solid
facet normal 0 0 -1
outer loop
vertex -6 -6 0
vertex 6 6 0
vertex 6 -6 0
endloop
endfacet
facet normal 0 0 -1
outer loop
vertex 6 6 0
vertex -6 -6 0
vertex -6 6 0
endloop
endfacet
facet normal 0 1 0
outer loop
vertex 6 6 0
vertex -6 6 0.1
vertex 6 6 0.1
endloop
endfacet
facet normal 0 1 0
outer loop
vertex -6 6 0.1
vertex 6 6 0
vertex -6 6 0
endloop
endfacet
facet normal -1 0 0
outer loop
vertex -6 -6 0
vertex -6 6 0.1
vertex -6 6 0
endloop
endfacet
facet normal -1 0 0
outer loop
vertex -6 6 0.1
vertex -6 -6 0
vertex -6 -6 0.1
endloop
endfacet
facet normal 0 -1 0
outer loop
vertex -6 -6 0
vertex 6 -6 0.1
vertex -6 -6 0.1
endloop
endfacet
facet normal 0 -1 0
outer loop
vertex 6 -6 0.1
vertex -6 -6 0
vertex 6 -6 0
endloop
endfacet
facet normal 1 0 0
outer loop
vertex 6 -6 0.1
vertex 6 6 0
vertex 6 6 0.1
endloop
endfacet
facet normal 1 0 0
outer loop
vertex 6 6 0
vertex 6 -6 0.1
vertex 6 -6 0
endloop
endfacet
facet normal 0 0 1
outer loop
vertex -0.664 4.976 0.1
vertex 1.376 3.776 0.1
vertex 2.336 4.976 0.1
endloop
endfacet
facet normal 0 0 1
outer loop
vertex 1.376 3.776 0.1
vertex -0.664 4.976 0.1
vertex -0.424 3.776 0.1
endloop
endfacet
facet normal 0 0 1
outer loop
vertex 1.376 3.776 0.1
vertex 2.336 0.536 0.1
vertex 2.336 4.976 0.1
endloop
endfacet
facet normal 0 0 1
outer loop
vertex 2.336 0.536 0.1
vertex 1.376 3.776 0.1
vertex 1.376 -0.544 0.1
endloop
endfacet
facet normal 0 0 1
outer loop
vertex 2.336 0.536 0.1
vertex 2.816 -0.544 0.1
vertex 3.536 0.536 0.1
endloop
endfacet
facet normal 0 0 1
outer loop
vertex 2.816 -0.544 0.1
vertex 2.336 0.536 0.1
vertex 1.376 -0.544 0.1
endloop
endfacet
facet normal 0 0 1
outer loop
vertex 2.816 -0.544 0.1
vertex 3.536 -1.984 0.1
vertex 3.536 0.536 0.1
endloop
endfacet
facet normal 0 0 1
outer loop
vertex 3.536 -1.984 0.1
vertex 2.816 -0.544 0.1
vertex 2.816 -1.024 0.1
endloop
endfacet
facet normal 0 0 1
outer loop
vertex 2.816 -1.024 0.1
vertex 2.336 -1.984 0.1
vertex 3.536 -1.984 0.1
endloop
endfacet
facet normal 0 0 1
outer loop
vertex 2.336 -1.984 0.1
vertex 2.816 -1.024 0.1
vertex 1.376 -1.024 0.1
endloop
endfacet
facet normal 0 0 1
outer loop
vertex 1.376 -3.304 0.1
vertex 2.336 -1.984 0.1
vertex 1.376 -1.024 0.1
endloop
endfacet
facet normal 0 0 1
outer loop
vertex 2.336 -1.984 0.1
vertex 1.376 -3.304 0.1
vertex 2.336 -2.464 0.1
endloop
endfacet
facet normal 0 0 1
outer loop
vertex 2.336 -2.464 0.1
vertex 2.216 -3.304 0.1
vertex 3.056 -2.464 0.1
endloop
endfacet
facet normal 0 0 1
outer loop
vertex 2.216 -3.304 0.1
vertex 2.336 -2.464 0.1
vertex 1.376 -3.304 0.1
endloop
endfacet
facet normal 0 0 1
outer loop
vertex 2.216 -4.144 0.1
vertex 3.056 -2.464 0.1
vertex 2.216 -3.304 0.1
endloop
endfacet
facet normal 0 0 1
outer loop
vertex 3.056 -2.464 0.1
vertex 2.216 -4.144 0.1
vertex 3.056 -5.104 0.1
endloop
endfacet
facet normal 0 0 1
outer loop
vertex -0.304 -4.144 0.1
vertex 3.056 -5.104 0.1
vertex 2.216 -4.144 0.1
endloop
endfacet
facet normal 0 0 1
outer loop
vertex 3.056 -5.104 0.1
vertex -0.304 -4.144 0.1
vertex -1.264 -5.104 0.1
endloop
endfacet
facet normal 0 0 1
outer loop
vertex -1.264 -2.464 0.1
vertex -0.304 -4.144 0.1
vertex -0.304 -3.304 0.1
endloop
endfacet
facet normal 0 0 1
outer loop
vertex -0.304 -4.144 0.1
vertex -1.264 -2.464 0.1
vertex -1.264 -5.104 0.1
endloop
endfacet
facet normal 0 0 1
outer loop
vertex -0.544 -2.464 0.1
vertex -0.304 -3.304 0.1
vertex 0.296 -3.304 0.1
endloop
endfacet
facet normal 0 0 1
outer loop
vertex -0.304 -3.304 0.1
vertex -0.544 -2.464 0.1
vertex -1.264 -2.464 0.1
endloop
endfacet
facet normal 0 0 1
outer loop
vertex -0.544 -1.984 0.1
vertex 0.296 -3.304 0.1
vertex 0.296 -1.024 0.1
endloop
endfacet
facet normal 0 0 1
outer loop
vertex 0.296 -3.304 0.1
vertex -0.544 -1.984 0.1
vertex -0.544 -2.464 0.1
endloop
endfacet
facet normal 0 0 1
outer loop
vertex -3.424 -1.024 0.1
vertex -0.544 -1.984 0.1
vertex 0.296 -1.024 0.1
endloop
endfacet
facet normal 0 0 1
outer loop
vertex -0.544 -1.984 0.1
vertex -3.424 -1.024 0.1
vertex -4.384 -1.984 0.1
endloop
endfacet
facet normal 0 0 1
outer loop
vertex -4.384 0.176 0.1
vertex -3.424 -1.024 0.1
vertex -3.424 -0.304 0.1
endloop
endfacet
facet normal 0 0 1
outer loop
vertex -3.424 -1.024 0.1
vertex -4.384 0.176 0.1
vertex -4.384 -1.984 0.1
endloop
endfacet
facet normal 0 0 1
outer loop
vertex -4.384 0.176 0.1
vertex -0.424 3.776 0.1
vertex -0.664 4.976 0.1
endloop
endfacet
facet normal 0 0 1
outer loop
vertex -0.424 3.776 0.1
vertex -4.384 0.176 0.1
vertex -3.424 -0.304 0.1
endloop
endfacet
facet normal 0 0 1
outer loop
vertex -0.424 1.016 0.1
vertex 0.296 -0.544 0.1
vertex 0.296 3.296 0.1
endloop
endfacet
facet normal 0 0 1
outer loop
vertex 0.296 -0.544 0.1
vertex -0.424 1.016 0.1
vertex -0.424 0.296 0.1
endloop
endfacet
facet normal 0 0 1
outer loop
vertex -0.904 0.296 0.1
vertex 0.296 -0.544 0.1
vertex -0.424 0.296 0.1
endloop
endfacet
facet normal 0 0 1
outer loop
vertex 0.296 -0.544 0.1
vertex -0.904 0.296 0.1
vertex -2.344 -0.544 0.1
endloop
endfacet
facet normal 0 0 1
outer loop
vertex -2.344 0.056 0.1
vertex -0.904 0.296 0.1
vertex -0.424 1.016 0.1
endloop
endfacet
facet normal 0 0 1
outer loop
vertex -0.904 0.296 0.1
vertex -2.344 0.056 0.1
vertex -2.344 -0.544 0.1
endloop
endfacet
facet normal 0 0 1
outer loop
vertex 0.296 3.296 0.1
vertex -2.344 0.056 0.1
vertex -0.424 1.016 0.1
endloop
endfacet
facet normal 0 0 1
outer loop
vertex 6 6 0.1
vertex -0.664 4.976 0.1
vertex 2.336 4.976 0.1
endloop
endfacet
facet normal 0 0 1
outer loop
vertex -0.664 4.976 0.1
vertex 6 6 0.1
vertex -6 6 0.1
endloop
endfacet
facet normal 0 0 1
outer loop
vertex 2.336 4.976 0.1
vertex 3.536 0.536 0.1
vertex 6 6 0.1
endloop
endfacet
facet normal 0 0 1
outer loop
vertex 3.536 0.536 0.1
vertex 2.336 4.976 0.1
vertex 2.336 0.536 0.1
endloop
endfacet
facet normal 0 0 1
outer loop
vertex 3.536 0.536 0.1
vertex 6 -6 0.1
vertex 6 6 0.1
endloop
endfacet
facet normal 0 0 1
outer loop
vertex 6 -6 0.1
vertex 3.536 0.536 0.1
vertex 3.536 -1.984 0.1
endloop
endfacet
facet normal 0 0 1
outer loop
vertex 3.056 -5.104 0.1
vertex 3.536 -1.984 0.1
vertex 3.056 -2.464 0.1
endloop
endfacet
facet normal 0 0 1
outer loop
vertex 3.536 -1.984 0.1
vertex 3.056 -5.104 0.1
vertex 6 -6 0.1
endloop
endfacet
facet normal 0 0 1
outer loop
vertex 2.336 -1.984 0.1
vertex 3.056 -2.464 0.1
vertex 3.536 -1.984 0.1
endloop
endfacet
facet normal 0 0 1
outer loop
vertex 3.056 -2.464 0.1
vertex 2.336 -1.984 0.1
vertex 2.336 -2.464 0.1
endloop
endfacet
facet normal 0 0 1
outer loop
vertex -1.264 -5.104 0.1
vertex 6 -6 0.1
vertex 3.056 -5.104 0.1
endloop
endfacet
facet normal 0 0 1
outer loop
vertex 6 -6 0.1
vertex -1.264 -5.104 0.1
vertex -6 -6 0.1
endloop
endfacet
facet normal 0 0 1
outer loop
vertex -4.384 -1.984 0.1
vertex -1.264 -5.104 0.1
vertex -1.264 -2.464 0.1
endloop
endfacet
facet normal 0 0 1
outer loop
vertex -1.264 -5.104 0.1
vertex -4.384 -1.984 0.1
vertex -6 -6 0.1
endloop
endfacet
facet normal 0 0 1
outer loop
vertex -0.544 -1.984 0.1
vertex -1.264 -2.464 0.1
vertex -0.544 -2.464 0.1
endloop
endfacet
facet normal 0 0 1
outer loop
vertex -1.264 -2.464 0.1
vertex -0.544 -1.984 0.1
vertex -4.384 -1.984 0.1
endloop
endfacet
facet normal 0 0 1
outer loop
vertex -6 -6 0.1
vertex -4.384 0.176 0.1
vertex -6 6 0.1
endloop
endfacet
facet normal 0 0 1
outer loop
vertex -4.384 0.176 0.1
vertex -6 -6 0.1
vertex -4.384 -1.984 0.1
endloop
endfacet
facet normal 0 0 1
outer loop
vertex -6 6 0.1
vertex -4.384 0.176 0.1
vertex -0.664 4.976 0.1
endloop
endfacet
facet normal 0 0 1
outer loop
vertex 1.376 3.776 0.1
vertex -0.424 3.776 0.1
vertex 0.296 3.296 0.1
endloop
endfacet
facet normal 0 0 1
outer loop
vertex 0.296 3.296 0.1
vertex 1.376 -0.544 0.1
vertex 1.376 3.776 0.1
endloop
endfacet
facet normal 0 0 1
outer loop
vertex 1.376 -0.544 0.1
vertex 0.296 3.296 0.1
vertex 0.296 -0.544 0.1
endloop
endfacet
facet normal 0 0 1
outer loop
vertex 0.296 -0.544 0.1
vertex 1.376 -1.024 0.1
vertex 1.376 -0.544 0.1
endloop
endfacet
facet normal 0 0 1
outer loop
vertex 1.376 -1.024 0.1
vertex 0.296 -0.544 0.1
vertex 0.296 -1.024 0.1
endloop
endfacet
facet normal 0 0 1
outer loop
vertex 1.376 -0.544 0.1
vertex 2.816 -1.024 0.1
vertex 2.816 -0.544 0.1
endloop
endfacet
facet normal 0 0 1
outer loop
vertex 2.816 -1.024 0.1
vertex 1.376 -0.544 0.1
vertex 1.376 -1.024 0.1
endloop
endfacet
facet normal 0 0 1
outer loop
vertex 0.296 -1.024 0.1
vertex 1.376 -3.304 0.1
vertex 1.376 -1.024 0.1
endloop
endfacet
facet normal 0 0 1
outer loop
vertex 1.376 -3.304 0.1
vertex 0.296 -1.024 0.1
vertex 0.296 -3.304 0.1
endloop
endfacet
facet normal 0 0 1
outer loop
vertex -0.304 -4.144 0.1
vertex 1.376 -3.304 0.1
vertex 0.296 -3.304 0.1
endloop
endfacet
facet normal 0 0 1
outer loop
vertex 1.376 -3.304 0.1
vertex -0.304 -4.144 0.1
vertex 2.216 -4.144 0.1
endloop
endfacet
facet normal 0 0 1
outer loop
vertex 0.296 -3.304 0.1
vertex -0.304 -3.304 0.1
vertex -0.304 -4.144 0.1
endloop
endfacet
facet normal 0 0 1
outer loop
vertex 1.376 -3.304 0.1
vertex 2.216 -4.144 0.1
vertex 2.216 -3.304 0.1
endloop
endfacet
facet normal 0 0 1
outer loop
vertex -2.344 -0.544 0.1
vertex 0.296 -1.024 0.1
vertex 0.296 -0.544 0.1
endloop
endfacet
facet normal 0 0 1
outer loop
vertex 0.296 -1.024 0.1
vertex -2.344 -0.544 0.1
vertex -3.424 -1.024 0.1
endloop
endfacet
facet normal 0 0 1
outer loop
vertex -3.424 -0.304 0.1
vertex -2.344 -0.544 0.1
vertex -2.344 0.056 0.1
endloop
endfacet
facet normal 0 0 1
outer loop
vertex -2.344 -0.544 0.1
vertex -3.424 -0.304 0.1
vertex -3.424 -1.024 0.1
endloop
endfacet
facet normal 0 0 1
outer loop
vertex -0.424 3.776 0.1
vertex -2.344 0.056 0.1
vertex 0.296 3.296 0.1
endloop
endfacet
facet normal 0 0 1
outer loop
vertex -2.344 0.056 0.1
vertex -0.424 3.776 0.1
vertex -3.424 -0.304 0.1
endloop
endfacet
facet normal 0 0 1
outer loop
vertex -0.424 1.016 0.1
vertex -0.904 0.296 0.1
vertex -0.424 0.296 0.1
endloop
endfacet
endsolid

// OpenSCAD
// file: ../p/box5-12.scad
use <../lib.scad>
function ldraw_lib__box5_12() = [
// 0 Box with 5 Faces without Any Edges
// 0 Name: box5-12.dat
// 0 Author: Chris Dee [cwdee]
// 0 !LDRAW_ORG Primitive UPDATE 2009-02
// 0 !LICENSE Licensed under CC BY 4.0 : see CAreadme.txt
// 
// 0 BFC CERTIFY CCW
  [0,"BFC","CERTIFY"],
  [0,"BFC","CCW"],
// 
// 0 !HISTORY 2009-09-03 [PTadmin] Official Update 2009-02
// 
// 
// 4 16 1 1 1 1 1 -1 -1 1 -1 -1 1 1
  [4,16,1,1,1,1,1,-1,-1,1,-1,-1,1,1],
// 4 16 -1 0 1 1 0 1 1 1 1 -1 1 1
  [4,16,-1,0,1,1,0,1,1,1,1,-1,1,1],
// 4 16 -1 0 -1 -1 0 1 -1 1 1 -1 1 -1
  [4,16,-1,0,-1,-1,0,1,-1,1,1,-1,1,-1],
// 4 16 1 0 -1 -1 0 -1 -1 1 -1 1 1 -1
  [4,16,1,0,-1,-1,0,-1,-1,1,-1,1,1,-1],
// 4 16 1 0 1 1 0 -1 1 1 -1 1 1 1
  [4,16,1,0,1,1,0,-1,1,1,-1,1,1,1],
// 0
];
module ldraw_lib__box5_12(step=0, col=false, unit=2/5, alt=false, line=0.2, solid=!$preview)
    makepoly(ldraw_lib__box5_12(), step=step, col=col, unit=unit, alt=alt, line=line, solid=solid);
ldraw_lib__box5_12(line=0.2);
// main file
use <../lib.scad>
use <../p/box5-12.scad>
function ldraw_lib__165395b() = [
// 0 Sticker  1.5 x  1.5 with Yellow Outlined "4"
// 0 Name: 165395b.dat
// 0 Author: Takeshi Takahashi [RainbowDolphin]
// 0 !LDRAW_ORG Part UPDATE 2024-01
// 0 !LICENSE Licensed under CC BY 4.0 : see CAreadme.txt
// 
// 0 BFC CERTIFY CCW
  [0,"BFC","CERTIFY"],
  [0,"BFC","CCW"],
// 
// 0 !KEYWORDS Bricklink 6551stk01, Brickowl 930700, race car, Rebrickable 165395
// 0 !KEYWORDS Set 6551
// 
// 0 !HISTORY 2024-01-29 [OrionP] Official Update 2024-01
// 
// 
// 1 16 0 -0.25 0 15 0 0 0 0.25 0 0 0 15 box5-12.dat
  [1,16,0,-0.25,0,15,0,0,0,0.25,0,0,0,15, ldraw_lib__box5_12()],
// 0 BFC NOCLIP
  [0,"BFC","NOCLIP"],
// 4 14 -1.66 -0.25 12.44 -1.06 -0.25 9.44 3.44 -0.25 9.44 5.84 -0.25 12.44
  [4,14,-1.66,-0.25,12.44,-1.06,-0.25,9.44,3.44,-0.25,9.44,5.84,-0.25,12.44],
// 4 14 3.44 -0.25 -1.36 5.84 -0.25 1.34 5.84 -0.25 12.44 3.44 -0.25 9.44
  [4,14,3.44,-0.25,-1.36,5.84,-0.25,1.34,5.84,-0.25,12.44,3.44,-0.25,9.44],
// 4 14 7.04 -0.25 -1.36 8.84 -0.25 1.34 5.84 -0.25 1.34 3.44 -0.25 -1.36
  [4,14,7.04,-0.25,-1.36,8.84,-0.25,1.34,5.84,-0.25,1.34,3.44,-0.25,-1.36],
// 4 14 7.04 -0.25 -1.36 7.04 -0.25 -2.56 8.84 -0.25 -4.96 8.84 -0.25 1.34
  [4,14,7.04,-0.25,-1.36,7.04,-0.25,-2.56,8.84,-0.25,-4.96,8.84,-0.25,1.34],
// 4 14 7.04 -0.25 -2.56 3.44 -0.25 -2.56 5.84 -0.25 -4.96 8.84 -0.25 -4.96
  [4,14,7.04,-0.25,-2.56,3.44,-0.25,-2.56,5.84,-0.25,-4.96,8.84,-0.25,-4.96],
// 4 14 3.44 -0.25 -8.26 5.84 -0.25 -6.16 5.84 -0.25 -4.96 3.44 -0.25 -2.56
  [4,14,3.44,-0.25,-8.26,5.84,-0.25,-6.16,5.84,-0.25,-4.96,3.44,-0.25,-2.56],
// 4 14 3.44 -0.25 -8.26 5.54 -0.25 -8.26 7.64 -0.25 -6.16 5.84 -0.25 -6.16
  [4,14,3.44,-0.25,-8.26,5.54,-0.25,-8.26,7.64,-0.25,-6.16,5.84,-0.25,-6.16],
// 4 14 5.54 -0.25 -10.36 7.64 -0.25 -12.76 7.64 -0.25 -6.16 5.54 -0.25 -8.26
  [4,14,5.54,-0.25,-10.36,7.64,-0.25,-12.76,7.64,-0.25,-6.16,5.54,-0.25,-8.26],
// 4 14 5.54 -0.25 -10.36 -0.76 -0.25 -10.36 -3.16 -0.25 -12.76 7.64 -0.25 -12.76
  [4,14,5.54,-0.25,-10.36,-0.76,-0.25,-10.36,-3.16,-0.25,-12.76,7.64,-0.25,-12.76],
// 4 14 -0.76 -0.25 -10.36 -0.76 -0.25 -8.26 -3.16 -0.25 -6.16 -3.16 -0.25 -12.76
  [4,14,-0.76,-0.25,-10.36,-0.76,-0.25,-8.26,-3.16,-0.25,-6.16,-3.16,-0.25,-12.76],
// 4 14 0.74 -0.25 -8.26 -1.36 -0.25 -6.16 -3.16 -0.25 -6.16 -0.76 -0.25 -8.26
  [4,14,0.74,-0.25,-8.26,-1.36,-0.25,-6.16,-3.16,-0.25,-6.16,-0.76,-0.25,-8.26],
// 4 14 0.74 -0.25 -8.26 0.74 -0.25 -2.56 -1.36 -0.25 -4.96 -1.36 -0.25 -6.16
  [4,14,0.74,-0.25,-8.26,0.74,-0.25,-2.56,-1.36,-0.25,-4.96,-1.36,-0.25,-6.16],
// 4 14 -8.56 -0.25 -2.56 -10.96 -0.25 -4.96 -1.36 -0.25 -4.96 0.74 -0.25 -2.56
  [4,14,-8.56,-0.25,-2.56,-10.96,-0.25,-4.96,-1.36,-0.25,-4.96,0.74,-0.25,-2.56],
// 4 14 -8.56 -0.25 -2.56 -8.56 -0.25 -0.76 -10.96 -0.25 0.44 -10.96 -0.25 -4.96
  [4,14,-8.56,-0.25,-2.56,-8.56,-0.25,-0.76,-10.96,-0.25,0.44,-10.96,-0.25,-4.96],
// 4 14 -8.56 -0.25 -0.76 -1.06 -0.25 9.44 -1.66 -0.25 12.44 -10.96 -0.25 0.44
  [4,14,-8.56,-0.25,-0.76,-1.06,-0.25,9.44,-1.66,-0.25,12.44,-10.96,-0.25,0.44],
// 4 14 0.74 -0.25 -1.36 0.74 -0.25 8.24 -1.06 -0.25 2.54 -1.06 -0.25 0.74
  [4,14,0.74,-0.25,-1.36,0.74,-0.25,8.24,-1.06,-0.25,2.54,-1.06,-0.25,0.74],
// 4 14 -1.06 -0.25 0.74 -2.26 -0.25 0.74 -5.86 -0.25 -1.36 0.74 -0.25 -1.36
  [4,14,-1.06,-0.25,0.74,-2.26,-0.25,0.74,-5.86,-0.25,-1.36,0.74,-0.25,-1.36],
// 4 14 -1.06 -0.25 2.54 -5.86 -0.25 0.14 -5.86 -0.25 -1.36 -2.26 -0.25 0.74
  [4,14,-1.06,-0.25,2.54,-5.86,-0.25,0.14,-5.86,-0.25,-1.36,-2.26,-0.25,0.74],
// 3 14 0.74 -0.25 8.24 -5.86 -0.25 0.14 -1.06 -0.25 2.54
  [3,14,0.74,-0.25,8.24,-5.86,-0.25,0.14,-1.06,-0.25,2.54],
// 0 BFC CLIP
  [0,"BFC","CLIP"],
// 4 16 15 -0.25 15 -15 -0.25 15 -1.66 -0.25 12.44 5.84 -0.25 12.44
  [4,16,15,-0.25,15,-15,-0.25,15,-1.66,-0.25,12.44,5.84,-0.25,12.44],
// 4 16 15 -0.25 15 5.84 -0.25 12.44 5.84 -0.25 1.34 8.84 -0.25 1.34
  [4,16,15,-0.25,15,5.84,-0.25,12.44,5.84,-0.25,1.34,8.84,-0.25,1.34],
// 4 16 15 -0.25 -15 15 -0.25 15 8.84 -0.25 1.34 8.84 -0.25 -4.96
  [4,16,15,-0.25,-15,15,-0.25,15,8.84,-0.25,1.34,8.84,-0.25,-4.96],
// 4 16 15 -0.25 -15 8.84 -0.25 -4.96 7.64 -0.25 -6.16 7.64 -0.25 -12.76
  [4,16,15,-0.25,-15,8.84,-0.25,-4.96,7.64,-0.25,-6.16,7.64,-0.25,-12.76],
// 4 16 7.64 -0.25 -6.16 8.84 -0.25 -4.96 5.84 -0.25 -4.96 5.84 -0.25 -6.16
  [4,16,7.64,-0.25,-6.16,8.84,-0.25,-4.96,5.84,-0.25,-4.96,5.84,-0.25,-6.16],
// 4 16 15 -0.25 -15 7.64 -0.25 -12.76 -3.16 -0.25 -12.76 -15 -0.25 -15
  [4,16,15,-0.25,-15,7.64,-0.25,-12.76,-3.16,-0.25,-12.76,-15,-0.25,-15],
// 4 16 -15 -0.25 -15 -3.16 -0.25 -12.76 -3.16 -0.25 -6.16 -10.96 -0.25 -4.96
  [4,16,-15,-0.25,-15,-3.16,-0.25,-12.76,-3.16,-0.25,-6.16,-10.96,-0.25,-4.96],
// 4 16 -1.36 -0.25 -4.96 -10.96 -0.25 -4.96 -3.16 -0.25 -6.16 -1.36 -0.25 -6.16
  [4,16,-1.36,-0.25,-4.96,-10.96,-0.25,-4.96,-3.16,-0.25,-6.16,-1.36,-0.25,-6.16],
// 4 16 -15 -0.25 -15 -10.96 -0.25 -4.96 -10.96 -0.25 0.44 -15 -0.25 15
  [4,16,-15,-0.25,-15,-10.96,-0.25,-4.96,-10.96,-0.25,0.44,-15,-0.25,15],
// 3 16 -15 -0.25 15 -10.96 -0.25 0.44 -1.66 -0.25 12.44
  [3,16,-15,-0.25,15,-10.96,-0.25,0.44,-1.66,-0.25,12.44],
// 3 16 3.44 -0.25 9.44 -1.06 -0.25 9.44 0.74 -0.25 8.24
  [3,16,3.44,-0.25,9.44,-1.06,-0.25,9.44,0.74,-0.25,8.24],
// 4 16 3.44 -0.25 9.44 0.74 -0.25 8.24 0.74 -0.25 -1.36 3.44 -0.25 -1.36
  [4,16,3.44,-0.25,9.44,0.74,-0.25,8.24,0.74,-0.25,-1.36,3.44,-0.25,-1.36],
// 4 16 3.44 -0.25 -1.36 0.74 -0.25 -1.36 0.74 -0.25 -2.56 3.44 -0.25 -2.56
  [4,16,3.44,-0.25,-1.36,0.74,-0.25,-1.36,0.74,-0.25,-2.56,3.44,-0.25,-2.56],
// 4 16 7.04 -0.25 -1.36 3.44 -0.25 -1.36 3.44 -0.25 -2.56 7.04 -0.25 -2.56
  [4,16,7.04,-0.25,-1.36,3.44,-0.25,-1.36,3.44,-0.25,-2.56,7.04,-0.25,-2.56],
// 4 16 3.44 -0.25 -2.56 0.74 -0.25 -2.56 0.74 -0.25 -8.26 3.44 -0.25 -8.26
  [4,16,3.44,-0.25,-2.56,0.74,-0.25,-2.56,0.74,-0.25,-8.26,3.44,-0.25,-8.26],
// 4 16 3.44 -0.25 -8.26 0.74 -0.25 -8.26 -0.76 -0.25 -10.36 5.54 -0.25 -10.36
  [4,16,3.44,-0.25,-8.26,0.74,-0.25,-8.26,-0.76,-0.25,-10.36,5.54,-0.25,-10.36],
// 3 16 0.74 -0.25 -8.26 -0.76 -0.25 -8.26 -0.76 -0.25 -10.36
  [3,16,0.74,-0.25,-8.26,-0.76,-0.25,-8.26,-0.76,-0.25,-10.36],
// 3 16 3.44 -0.25 -8.26 5.54 -0.25 -10.36 5.54 -0.25 -8.26
  [3,16,3.44,-0.25,-8.26,5.54,-0.25,-10.36,5.54,-0.25,-8.26],
// 4 16 0.74 -0.25 -2.56 0.74 -0.25 -1.36 -5.86 -0.25 -1.36 -8.56 -0.25 -2.56
  [4,16,0.74,-0.25,-2.56,0.74,-0.25,-1.36,-5.86,-0.25,-1.36,-8.56,-0.25,-2.56],
// 4 16 -8.56 -0.25 -0.76 -8.56 -0.25 -2.56 -5.86 -0.25 -1.36 -5.86 -0.25 0.14
  [4,16,-8.56,-0.25,-0.76,-8.56,-0.25,-2.56,-5.86,-0.25,-1.36,-5.86,-0.25,0.14],
// 4 16 -1.06 -0.25 9.44 -8.56 -0.25 -0.76 -5.86 -0.25 0.14 0.74 -0.25 8.24
  [4,16,-1.06,-0.25,9.44,-8.56,-0.25,-0.76,-5.86,-0.25,0.14,0.74,-0.25,8.24],
// 3 16 -1.06 -0.25 2.54 -2.26 -0.25 0.74 -1.06 -0.25 0.74
  [3,16,-1.06,-0.25,2.54,-2.26,-0.25,0.74,-1.06,-0.25,0.74],
];
module ldraw_lib__165395b(step=0, col=false, unit=2/5, alt=false, line=0.2, solid=!$preview)
    makepoly(ldraw_lib__165395b(), step=step, col=col, unit=unit, alt=alt, line=line, solid=solid);
ldraw_lib__165395b(line=0.2);
